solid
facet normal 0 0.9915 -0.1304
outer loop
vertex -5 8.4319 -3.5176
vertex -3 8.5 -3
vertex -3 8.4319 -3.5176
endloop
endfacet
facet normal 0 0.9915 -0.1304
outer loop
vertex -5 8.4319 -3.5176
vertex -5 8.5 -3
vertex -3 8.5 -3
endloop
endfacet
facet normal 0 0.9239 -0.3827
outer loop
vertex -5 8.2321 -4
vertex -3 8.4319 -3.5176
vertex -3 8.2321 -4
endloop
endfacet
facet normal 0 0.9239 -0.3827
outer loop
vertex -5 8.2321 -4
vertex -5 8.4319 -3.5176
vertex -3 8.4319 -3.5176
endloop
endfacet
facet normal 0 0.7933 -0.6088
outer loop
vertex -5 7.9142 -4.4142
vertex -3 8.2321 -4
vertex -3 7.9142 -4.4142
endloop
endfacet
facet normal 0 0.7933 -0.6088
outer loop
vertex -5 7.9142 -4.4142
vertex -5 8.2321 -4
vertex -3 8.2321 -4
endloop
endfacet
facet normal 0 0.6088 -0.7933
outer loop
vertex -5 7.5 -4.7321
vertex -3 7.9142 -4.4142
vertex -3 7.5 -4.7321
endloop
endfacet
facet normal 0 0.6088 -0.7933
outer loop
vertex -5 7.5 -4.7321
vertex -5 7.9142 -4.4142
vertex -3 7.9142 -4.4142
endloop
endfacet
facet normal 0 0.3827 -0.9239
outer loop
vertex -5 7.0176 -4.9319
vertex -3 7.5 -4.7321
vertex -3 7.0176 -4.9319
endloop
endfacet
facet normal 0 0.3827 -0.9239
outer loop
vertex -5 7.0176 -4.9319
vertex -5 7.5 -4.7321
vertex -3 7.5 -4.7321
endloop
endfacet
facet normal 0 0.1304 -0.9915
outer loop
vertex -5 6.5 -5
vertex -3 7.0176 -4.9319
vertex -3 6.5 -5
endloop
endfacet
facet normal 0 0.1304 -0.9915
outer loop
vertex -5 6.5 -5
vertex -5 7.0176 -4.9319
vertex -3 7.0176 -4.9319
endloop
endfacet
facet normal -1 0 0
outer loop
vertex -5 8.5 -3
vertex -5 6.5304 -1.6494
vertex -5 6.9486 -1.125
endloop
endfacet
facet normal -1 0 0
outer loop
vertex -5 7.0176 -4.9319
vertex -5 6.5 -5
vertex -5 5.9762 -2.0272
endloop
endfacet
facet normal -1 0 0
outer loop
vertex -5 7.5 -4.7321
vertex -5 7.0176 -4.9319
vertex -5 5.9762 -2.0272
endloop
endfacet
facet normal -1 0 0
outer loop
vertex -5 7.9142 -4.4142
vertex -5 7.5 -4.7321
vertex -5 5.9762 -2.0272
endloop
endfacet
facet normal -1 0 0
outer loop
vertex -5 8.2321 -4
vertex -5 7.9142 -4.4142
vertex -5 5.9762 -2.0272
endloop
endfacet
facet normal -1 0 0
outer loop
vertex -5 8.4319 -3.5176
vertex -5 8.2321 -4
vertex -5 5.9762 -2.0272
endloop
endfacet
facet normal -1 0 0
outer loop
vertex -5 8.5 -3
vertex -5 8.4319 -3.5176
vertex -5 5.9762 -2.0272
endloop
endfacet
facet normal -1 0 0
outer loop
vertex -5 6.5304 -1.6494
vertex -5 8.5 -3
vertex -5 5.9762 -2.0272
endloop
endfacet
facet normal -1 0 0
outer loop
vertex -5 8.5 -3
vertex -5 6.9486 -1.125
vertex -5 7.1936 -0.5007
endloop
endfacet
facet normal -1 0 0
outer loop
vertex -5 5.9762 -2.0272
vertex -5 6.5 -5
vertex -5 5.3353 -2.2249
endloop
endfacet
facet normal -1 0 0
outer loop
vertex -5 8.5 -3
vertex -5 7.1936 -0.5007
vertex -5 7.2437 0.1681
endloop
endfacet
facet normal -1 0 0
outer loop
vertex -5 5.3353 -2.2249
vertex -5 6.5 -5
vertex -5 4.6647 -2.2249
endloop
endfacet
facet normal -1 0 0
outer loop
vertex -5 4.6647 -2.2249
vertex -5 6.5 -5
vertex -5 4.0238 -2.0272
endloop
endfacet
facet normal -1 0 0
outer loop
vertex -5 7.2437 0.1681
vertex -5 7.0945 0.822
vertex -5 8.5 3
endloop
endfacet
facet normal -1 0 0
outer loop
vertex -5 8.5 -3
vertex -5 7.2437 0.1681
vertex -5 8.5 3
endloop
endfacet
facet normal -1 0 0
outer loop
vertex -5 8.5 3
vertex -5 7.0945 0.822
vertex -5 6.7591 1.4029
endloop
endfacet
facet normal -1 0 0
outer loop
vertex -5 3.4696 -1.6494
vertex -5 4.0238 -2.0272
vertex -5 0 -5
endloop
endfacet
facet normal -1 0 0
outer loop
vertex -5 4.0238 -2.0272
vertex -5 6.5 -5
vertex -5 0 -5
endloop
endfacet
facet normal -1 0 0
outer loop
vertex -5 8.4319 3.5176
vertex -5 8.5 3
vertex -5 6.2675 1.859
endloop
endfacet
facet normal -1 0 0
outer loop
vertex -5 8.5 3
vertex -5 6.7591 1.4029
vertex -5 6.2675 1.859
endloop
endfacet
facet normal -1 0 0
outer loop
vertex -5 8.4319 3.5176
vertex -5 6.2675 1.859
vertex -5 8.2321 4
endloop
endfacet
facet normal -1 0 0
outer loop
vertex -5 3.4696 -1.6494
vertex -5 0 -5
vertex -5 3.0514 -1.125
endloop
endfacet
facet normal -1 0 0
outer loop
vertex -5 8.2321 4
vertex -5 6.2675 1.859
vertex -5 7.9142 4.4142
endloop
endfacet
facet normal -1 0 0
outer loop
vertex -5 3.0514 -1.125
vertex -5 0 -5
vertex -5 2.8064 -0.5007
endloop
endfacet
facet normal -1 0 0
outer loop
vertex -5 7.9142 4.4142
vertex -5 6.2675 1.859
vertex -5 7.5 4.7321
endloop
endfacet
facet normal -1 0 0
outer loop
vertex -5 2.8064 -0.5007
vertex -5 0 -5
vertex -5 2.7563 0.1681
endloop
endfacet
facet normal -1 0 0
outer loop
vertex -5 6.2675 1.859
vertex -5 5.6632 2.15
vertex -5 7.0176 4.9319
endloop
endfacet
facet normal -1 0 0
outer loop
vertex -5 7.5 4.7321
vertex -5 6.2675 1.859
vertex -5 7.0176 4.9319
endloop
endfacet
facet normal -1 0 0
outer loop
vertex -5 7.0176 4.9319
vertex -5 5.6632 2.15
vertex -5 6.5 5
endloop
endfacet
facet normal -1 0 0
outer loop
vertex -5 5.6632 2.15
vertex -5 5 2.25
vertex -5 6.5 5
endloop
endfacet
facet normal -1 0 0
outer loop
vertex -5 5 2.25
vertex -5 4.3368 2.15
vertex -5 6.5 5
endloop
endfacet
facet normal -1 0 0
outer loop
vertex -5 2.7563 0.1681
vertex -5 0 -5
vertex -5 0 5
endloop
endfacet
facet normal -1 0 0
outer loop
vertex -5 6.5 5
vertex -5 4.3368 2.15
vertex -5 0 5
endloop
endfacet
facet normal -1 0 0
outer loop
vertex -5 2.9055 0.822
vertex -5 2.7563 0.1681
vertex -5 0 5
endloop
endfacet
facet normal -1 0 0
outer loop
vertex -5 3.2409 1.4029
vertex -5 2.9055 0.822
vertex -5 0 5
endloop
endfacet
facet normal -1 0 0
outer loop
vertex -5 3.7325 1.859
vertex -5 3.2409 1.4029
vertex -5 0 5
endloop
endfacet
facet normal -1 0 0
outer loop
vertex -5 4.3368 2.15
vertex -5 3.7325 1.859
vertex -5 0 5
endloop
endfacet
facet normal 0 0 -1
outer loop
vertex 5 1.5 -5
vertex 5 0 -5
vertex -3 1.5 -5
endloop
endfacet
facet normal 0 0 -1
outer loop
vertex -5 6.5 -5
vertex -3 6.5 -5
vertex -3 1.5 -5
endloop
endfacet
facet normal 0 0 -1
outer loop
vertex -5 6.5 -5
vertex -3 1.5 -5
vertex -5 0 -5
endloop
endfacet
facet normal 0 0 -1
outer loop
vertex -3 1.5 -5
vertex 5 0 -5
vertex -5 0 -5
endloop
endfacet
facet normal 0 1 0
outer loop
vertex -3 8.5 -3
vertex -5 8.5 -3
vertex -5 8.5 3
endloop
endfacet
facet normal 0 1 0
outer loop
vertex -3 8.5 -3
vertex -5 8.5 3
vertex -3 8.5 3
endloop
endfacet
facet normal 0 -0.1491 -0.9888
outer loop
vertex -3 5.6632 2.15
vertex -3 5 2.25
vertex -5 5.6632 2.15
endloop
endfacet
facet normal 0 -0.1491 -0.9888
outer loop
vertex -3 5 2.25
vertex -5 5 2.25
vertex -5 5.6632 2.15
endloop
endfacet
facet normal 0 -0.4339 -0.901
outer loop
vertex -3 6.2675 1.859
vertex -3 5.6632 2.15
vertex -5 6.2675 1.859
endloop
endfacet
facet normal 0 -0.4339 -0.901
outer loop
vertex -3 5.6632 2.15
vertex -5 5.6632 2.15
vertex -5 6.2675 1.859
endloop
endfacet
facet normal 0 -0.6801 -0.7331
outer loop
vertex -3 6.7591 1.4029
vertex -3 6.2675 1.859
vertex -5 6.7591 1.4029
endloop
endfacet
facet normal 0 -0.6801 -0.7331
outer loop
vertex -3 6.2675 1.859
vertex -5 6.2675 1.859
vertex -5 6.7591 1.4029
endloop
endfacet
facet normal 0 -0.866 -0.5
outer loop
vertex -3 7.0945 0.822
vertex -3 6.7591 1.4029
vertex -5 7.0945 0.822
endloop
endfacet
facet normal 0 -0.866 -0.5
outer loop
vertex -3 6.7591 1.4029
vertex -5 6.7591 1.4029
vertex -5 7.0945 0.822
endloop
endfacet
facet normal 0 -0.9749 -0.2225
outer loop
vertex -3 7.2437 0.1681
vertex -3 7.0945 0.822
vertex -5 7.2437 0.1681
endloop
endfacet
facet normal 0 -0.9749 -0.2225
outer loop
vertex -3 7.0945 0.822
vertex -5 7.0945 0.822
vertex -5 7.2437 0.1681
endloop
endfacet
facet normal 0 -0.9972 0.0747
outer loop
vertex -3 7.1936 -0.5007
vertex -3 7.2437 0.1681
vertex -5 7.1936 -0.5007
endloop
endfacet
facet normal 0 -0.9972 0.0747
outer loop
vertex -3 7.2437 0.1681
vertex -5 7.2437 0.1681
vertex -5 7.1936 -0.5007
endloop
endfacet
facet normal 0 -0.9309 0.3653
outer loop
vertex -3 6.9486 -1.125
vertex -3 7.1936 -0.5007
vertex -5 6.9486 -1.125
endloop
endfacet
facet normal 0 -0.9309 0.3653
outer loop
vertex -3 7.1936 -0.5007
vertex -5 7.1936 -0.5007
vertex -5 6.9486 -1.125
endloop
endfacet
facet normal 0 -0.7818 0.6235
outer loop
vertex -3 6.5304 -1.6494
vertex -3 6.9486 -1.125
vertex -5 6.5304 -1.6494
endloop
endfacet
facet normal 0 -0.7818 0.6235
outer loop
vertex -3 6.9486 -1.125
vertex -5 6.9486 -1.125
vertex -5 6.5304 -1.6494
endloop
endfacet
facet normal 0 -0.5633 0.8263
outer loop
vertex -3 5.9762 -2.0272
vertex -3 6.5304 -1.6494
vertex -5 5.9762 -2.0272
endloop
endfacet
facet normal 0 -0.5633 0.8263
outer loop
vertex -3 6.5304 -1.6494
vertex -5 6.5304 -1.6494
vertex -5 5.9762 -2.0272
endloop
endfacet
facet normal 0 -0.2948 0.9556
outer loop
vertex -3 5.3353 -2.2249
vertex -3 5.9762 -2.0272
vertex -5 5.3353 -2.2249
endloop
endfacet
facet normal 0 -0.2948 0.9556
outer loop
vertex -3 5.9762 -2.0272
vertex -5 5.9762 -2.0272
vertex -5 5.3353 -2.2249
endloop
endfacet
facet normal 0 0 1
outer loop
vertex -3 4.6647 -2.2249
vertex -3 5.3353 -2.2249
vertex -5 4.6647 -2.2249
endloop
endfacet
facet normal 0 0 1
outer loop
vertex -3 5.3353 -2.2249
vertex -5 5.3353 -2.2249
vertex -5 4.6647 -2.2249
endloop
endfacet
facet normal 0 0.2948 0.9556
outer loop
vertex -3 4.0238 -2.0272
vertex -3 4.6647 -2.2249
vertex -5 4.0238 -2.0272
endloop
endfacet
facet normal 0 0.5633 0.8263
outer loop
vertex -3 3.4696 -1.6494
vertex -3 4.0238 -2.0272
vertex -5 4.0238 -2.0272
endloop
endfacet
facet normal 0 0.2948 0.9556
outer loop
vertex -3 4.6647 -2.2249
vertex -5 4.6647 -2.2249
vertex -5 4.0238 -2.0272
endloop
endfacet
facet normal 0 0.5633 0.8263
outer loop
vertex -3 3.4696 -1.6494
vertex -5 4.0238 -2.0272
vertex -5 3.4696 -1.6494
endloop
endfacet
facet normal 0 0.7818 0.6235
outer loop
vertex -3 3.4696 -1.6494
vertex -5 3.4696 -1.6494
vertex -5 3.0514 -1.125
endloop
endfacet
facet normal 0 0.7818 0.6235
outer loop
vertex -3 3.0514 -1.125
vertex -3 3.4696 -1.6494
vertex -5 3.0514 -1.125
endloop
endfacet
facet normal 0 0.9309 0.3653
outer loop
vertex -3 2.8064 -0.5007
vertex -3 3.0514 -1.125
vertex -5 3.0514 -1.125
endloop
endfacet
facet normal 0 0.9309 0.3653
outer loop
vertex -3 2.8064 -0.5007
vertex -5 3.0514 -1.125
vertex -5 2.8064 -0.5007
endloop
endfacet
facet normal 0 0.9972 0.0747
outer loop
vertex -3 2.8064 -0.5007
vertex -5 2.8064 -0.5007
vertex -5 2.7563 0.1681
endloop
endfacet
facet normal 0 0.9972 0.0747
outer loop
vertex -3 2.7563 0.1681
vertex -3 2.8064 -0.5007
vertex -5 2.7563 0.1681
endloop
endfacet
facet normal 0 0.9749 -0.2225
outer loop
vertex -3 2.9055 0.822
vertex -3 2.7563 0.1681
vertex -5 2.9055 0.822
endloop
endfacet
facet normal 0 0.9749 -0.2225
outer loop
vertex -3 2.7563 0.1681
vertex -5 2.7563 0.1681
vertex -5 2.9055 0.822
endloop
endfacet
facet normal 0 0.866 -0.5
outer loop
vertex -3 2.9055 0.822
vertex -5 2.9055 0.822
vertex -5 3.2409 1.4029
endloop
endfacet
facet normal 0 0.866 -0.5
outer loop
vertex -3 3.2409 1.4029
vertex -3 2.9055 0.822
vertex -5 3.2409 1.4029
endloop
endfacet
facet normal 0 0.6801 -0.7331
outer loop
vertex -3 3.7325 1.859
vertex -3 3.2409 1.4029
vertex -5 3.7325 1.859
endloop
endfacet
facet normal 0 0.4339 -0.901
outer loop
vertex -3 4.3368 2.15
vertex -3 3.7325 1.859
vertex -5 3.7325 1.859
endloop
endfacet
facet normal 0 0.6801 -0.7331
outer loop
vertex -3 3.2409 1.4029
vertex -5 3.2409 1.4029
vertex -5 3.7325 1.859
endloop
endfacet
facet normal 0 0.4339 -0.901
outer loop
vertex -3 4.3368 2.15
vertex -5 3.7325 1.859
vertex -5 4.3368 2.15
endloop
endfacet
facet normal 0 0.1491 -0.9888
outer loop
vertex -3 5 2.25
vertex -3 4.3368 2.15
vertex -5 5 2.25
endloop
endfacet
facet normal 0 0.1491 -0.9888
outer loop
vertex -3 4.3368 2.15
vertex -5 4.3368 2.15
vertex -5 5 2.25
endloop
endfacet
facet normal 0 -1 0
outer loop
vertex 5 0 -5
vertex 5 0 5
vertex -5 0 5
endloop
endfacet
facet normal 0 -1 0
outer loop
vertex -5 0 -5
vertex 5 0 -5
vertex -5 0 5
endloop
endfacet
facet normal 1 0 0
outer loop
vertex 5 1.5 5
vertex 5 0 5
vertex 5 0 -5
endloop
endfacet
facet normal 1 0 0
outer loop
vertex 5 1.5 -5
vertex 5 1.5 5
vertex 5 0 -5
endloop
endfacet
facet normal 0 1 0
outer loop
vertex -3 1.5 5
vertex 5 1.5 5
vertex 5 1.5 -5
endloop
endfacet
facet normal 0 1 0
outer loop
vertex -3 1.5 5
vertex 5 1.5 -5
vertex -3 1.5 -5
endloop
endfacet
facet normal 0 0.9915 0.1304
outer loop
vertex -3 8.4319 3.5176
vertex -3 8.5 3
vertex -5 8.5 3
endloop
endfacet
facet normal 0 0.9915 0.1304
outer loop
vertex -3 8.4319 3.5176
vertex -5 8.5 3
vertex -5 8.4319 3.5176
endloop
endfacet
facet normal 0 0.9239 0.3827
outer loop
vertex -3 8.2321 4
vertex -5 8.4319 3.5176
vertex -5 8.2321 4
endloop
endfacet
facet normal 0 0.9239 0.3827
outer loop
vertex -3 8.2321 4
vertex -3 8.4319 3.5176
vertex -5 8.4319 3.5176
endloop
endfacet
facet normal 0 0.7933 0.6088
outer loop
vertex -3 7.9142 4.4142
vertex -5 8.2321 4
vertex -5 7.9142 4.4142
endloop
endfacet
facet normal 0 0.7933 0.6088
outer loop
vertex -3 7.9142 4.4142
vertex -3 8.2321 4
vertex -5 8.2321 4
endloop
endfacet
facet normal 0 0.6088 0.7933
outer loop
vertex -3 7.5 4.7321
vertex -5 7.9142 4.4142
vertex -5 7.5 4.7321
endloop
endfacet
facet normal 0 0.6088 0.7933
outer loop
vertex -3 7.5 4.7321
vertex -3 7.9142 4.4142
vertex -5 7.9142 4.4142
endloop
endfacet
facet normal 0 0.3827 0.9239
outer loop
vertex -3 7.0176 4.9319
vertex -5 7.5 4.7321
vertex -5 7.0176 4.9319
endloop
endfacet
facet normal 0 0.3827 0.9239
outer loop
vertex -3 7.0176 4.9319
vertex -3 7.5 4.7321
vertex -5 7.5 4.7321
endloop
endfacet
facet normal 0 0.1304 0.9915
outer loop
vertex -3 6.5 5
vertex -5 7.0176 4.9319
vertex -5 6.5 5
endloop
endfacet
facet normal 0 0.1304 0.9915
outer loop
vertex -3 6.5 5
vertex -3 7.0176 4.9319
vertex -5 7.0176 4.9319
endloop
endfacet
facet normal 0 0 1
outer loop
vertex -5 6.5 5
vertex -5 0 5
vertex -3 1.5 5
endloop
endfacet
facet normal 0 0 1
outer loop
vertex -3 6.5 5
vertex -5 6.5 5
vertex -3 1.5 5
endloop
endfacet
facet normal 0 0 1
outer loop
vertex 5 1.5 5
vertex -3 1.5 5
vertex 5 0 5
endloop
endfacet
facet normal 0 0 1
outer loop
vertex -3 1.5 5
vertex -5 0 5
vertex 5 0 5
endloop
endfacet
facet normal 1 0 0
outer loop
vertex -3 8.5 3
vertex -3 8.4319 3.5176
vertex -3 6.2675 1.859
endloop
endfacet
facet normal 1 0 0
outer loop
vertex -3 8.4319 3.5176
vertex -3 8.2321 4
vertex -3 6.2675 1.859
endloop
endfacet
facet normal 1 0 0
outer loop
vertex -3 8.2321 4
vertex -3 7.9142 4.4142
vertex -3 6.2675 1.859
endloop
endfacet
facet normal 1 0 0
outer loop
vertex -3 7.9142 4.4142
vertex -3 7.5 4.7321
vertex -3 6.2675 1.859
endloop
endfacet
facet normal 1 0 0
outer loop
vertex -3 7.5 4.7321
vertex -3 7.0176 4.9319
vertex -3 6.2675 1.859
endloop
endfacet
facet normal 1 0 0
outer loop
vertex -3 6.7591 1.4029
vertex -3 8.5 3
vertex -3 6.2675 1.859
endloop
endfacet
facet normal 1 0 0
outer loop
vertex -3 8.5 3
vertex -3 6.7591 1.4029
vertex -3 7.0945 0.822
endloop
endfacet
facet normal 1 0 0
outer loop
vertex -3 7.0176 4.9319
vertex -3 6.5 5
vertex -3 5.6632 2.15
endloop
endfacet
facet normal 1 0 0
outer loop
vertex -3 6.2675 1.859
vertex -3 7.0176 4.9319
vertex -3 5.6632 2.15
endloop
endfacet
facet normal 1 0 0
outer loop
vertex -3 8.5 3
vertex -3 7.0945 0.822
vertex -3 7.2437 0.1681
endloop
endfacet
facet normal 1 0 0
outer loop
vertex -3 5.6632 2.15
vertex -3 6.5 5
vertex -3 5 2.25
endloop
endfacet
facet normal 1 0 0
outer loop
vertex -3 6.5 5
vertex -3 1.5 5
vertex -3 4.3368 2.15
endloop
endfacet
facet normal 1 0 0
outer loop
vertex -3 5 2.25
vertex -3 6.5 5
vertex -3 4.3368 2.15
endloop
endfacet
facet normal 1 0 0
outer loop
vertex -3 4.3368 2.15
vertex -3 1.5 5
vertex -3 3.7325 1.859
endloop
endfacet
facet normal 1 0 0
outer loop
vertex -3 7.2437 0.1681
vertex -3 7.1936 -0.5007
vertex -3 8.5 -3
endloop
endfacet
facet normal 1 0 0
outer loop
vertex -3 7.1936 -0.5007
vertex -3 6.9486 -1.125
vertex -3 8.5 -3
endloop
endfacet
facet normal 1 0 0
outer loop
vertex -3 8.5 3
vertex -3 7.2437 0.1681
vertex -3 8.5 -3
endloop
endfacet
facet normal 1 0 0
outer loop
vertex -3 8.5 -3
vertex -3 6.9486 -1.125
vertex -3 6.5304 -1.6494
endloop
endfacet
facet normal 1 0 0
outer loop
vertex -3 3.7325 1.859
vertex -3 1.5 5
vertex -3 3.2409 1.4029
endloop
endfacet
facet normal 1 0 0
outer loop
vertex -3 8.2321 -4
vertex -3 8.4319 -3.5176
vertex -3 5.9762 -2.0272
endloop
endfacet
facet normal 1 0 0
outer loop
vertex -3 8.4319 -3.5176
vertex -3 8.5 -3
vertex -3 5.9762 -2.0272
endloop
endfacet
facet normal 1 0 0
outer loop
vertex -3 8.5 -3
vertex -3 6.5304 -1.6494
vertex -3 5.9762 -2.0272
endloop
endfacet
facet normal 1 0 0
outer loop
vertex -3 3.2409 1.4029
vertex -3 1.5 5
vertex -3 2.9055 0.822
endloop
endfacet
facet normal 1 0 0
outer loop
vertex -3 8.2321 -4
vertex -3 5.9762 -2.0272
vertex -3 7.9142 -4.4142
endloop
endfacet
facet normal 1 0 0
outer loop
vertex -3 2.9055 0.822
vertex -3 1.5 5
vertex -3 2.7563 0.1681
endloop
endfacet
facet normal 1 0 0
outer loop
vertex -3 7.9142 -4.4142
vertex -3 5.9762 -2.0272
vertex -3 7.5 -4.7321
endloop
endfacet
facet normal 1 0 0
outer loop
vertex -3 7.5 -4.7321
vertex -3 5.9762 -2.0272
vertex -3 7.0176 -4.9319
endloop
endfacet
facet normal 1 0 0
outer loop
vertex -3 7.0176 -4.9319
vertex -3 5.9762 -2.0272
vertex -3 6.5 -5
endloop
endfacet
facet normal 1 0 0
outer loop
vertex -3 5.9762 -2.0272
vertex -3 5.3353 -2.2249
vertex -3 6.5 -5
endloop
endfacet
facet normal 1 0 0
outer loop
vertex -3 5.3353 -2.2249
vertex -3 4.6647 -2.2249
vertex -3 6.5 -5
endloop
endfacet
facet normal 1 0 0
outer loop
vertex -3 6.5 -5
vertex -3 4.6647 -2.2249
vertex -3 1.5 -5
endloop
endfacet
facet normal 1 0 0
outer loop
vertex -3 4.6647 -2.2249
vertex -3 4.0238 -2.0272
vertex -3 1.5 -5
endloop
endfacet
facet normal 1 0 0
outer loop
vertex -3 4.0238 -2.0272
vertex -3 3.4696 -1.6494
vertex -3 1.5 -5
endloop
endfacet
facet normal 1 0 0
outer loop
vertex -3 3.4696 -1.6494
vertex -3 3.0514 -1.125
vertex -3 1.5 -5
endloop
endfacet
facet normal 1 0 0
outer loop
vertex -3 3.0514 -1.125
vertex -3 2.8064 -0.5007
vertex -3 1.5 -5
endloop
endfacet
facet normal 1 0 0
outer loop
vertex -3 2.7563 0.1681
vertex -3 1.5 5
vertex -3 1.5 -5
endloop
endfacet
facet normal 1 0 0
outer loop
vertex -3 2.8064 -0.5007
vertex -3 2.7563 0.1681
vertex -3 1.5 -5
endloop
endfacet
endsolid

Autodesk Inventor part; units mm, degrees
ref_plane "YZ Plane" through (0, 0, 0) normal (1, 0, 0) x (0, 1, 0)
ref_plane "XZ Plane" through (0, 0, 0) normal (0, 1, 0) x (-1, 0, 0)
ref_plane "XY Plane" through (0, 0, 0) normal (0, 0, 1) x (1, 0, 0)
sketch "Sketch1" plane through (0, 0, 0) normal (0, 1, 0) x (-1, 0, 0)
  line L0 (5, 5) -> (-5, 5)
  line L1 (-5, 5) -> (-5, -5)
  line L2 (-5, -5) -> (5, -5)
  line L3 (5, -5) -> (5, 5)
  line L4 (5, 5) -> (-5, -5) construction
  line L5 (-5, 5) -> (5, -5) construction
  point P0 (0, 0)
  dimension "d0" = 10
  dimension "d1" = 10
extrude "Extrusion1" add sketch "Sketch1" along normal blind 1.5
sketch "Sketch2" plane through (0, 1.5, 0) normal (0, 1, 0) x (1, 0, 0)
  line L0 (-5, -5) -> (5, -5) projected
  line L1 (5, 5) -> (-5, 5) projected
  line L2 (-5, -5) -> (-3, -5)
  line L3 (-3, -5) -> (-3, 5)
  line L4 (-3, 5) -> (-5, 5)
  line L5 (-5, 5) -> (-5, -5)
  point P0 (0, 0)
  dimension "d4" = 2
extrude "Extrusion2" add sketch "Sketch2" along normal blind 7
sketch "Sketch3" plane through (-5, 0, -5) normal (-1, 0, 0) x (0, 0, 1)
  circle A0 centre (5, 5) radius 2.25
  line L0 (0, 0) -> (10, 0) projected
  line L1 (0, 0) -> (0, 8.5) projected
  point P0 (5, 0)
  dimension "d7" = 4.5
  dimension "d8" = 5
  dimension "d9" = 5
extrude "Extrusion3" cut sketch "Sketch3" against normal through all
fillet "Fillet1" radius 2 2 edges at (-4, 8.5, 5) (-4, 8.5, -5)
properties part number "screw_holder"
